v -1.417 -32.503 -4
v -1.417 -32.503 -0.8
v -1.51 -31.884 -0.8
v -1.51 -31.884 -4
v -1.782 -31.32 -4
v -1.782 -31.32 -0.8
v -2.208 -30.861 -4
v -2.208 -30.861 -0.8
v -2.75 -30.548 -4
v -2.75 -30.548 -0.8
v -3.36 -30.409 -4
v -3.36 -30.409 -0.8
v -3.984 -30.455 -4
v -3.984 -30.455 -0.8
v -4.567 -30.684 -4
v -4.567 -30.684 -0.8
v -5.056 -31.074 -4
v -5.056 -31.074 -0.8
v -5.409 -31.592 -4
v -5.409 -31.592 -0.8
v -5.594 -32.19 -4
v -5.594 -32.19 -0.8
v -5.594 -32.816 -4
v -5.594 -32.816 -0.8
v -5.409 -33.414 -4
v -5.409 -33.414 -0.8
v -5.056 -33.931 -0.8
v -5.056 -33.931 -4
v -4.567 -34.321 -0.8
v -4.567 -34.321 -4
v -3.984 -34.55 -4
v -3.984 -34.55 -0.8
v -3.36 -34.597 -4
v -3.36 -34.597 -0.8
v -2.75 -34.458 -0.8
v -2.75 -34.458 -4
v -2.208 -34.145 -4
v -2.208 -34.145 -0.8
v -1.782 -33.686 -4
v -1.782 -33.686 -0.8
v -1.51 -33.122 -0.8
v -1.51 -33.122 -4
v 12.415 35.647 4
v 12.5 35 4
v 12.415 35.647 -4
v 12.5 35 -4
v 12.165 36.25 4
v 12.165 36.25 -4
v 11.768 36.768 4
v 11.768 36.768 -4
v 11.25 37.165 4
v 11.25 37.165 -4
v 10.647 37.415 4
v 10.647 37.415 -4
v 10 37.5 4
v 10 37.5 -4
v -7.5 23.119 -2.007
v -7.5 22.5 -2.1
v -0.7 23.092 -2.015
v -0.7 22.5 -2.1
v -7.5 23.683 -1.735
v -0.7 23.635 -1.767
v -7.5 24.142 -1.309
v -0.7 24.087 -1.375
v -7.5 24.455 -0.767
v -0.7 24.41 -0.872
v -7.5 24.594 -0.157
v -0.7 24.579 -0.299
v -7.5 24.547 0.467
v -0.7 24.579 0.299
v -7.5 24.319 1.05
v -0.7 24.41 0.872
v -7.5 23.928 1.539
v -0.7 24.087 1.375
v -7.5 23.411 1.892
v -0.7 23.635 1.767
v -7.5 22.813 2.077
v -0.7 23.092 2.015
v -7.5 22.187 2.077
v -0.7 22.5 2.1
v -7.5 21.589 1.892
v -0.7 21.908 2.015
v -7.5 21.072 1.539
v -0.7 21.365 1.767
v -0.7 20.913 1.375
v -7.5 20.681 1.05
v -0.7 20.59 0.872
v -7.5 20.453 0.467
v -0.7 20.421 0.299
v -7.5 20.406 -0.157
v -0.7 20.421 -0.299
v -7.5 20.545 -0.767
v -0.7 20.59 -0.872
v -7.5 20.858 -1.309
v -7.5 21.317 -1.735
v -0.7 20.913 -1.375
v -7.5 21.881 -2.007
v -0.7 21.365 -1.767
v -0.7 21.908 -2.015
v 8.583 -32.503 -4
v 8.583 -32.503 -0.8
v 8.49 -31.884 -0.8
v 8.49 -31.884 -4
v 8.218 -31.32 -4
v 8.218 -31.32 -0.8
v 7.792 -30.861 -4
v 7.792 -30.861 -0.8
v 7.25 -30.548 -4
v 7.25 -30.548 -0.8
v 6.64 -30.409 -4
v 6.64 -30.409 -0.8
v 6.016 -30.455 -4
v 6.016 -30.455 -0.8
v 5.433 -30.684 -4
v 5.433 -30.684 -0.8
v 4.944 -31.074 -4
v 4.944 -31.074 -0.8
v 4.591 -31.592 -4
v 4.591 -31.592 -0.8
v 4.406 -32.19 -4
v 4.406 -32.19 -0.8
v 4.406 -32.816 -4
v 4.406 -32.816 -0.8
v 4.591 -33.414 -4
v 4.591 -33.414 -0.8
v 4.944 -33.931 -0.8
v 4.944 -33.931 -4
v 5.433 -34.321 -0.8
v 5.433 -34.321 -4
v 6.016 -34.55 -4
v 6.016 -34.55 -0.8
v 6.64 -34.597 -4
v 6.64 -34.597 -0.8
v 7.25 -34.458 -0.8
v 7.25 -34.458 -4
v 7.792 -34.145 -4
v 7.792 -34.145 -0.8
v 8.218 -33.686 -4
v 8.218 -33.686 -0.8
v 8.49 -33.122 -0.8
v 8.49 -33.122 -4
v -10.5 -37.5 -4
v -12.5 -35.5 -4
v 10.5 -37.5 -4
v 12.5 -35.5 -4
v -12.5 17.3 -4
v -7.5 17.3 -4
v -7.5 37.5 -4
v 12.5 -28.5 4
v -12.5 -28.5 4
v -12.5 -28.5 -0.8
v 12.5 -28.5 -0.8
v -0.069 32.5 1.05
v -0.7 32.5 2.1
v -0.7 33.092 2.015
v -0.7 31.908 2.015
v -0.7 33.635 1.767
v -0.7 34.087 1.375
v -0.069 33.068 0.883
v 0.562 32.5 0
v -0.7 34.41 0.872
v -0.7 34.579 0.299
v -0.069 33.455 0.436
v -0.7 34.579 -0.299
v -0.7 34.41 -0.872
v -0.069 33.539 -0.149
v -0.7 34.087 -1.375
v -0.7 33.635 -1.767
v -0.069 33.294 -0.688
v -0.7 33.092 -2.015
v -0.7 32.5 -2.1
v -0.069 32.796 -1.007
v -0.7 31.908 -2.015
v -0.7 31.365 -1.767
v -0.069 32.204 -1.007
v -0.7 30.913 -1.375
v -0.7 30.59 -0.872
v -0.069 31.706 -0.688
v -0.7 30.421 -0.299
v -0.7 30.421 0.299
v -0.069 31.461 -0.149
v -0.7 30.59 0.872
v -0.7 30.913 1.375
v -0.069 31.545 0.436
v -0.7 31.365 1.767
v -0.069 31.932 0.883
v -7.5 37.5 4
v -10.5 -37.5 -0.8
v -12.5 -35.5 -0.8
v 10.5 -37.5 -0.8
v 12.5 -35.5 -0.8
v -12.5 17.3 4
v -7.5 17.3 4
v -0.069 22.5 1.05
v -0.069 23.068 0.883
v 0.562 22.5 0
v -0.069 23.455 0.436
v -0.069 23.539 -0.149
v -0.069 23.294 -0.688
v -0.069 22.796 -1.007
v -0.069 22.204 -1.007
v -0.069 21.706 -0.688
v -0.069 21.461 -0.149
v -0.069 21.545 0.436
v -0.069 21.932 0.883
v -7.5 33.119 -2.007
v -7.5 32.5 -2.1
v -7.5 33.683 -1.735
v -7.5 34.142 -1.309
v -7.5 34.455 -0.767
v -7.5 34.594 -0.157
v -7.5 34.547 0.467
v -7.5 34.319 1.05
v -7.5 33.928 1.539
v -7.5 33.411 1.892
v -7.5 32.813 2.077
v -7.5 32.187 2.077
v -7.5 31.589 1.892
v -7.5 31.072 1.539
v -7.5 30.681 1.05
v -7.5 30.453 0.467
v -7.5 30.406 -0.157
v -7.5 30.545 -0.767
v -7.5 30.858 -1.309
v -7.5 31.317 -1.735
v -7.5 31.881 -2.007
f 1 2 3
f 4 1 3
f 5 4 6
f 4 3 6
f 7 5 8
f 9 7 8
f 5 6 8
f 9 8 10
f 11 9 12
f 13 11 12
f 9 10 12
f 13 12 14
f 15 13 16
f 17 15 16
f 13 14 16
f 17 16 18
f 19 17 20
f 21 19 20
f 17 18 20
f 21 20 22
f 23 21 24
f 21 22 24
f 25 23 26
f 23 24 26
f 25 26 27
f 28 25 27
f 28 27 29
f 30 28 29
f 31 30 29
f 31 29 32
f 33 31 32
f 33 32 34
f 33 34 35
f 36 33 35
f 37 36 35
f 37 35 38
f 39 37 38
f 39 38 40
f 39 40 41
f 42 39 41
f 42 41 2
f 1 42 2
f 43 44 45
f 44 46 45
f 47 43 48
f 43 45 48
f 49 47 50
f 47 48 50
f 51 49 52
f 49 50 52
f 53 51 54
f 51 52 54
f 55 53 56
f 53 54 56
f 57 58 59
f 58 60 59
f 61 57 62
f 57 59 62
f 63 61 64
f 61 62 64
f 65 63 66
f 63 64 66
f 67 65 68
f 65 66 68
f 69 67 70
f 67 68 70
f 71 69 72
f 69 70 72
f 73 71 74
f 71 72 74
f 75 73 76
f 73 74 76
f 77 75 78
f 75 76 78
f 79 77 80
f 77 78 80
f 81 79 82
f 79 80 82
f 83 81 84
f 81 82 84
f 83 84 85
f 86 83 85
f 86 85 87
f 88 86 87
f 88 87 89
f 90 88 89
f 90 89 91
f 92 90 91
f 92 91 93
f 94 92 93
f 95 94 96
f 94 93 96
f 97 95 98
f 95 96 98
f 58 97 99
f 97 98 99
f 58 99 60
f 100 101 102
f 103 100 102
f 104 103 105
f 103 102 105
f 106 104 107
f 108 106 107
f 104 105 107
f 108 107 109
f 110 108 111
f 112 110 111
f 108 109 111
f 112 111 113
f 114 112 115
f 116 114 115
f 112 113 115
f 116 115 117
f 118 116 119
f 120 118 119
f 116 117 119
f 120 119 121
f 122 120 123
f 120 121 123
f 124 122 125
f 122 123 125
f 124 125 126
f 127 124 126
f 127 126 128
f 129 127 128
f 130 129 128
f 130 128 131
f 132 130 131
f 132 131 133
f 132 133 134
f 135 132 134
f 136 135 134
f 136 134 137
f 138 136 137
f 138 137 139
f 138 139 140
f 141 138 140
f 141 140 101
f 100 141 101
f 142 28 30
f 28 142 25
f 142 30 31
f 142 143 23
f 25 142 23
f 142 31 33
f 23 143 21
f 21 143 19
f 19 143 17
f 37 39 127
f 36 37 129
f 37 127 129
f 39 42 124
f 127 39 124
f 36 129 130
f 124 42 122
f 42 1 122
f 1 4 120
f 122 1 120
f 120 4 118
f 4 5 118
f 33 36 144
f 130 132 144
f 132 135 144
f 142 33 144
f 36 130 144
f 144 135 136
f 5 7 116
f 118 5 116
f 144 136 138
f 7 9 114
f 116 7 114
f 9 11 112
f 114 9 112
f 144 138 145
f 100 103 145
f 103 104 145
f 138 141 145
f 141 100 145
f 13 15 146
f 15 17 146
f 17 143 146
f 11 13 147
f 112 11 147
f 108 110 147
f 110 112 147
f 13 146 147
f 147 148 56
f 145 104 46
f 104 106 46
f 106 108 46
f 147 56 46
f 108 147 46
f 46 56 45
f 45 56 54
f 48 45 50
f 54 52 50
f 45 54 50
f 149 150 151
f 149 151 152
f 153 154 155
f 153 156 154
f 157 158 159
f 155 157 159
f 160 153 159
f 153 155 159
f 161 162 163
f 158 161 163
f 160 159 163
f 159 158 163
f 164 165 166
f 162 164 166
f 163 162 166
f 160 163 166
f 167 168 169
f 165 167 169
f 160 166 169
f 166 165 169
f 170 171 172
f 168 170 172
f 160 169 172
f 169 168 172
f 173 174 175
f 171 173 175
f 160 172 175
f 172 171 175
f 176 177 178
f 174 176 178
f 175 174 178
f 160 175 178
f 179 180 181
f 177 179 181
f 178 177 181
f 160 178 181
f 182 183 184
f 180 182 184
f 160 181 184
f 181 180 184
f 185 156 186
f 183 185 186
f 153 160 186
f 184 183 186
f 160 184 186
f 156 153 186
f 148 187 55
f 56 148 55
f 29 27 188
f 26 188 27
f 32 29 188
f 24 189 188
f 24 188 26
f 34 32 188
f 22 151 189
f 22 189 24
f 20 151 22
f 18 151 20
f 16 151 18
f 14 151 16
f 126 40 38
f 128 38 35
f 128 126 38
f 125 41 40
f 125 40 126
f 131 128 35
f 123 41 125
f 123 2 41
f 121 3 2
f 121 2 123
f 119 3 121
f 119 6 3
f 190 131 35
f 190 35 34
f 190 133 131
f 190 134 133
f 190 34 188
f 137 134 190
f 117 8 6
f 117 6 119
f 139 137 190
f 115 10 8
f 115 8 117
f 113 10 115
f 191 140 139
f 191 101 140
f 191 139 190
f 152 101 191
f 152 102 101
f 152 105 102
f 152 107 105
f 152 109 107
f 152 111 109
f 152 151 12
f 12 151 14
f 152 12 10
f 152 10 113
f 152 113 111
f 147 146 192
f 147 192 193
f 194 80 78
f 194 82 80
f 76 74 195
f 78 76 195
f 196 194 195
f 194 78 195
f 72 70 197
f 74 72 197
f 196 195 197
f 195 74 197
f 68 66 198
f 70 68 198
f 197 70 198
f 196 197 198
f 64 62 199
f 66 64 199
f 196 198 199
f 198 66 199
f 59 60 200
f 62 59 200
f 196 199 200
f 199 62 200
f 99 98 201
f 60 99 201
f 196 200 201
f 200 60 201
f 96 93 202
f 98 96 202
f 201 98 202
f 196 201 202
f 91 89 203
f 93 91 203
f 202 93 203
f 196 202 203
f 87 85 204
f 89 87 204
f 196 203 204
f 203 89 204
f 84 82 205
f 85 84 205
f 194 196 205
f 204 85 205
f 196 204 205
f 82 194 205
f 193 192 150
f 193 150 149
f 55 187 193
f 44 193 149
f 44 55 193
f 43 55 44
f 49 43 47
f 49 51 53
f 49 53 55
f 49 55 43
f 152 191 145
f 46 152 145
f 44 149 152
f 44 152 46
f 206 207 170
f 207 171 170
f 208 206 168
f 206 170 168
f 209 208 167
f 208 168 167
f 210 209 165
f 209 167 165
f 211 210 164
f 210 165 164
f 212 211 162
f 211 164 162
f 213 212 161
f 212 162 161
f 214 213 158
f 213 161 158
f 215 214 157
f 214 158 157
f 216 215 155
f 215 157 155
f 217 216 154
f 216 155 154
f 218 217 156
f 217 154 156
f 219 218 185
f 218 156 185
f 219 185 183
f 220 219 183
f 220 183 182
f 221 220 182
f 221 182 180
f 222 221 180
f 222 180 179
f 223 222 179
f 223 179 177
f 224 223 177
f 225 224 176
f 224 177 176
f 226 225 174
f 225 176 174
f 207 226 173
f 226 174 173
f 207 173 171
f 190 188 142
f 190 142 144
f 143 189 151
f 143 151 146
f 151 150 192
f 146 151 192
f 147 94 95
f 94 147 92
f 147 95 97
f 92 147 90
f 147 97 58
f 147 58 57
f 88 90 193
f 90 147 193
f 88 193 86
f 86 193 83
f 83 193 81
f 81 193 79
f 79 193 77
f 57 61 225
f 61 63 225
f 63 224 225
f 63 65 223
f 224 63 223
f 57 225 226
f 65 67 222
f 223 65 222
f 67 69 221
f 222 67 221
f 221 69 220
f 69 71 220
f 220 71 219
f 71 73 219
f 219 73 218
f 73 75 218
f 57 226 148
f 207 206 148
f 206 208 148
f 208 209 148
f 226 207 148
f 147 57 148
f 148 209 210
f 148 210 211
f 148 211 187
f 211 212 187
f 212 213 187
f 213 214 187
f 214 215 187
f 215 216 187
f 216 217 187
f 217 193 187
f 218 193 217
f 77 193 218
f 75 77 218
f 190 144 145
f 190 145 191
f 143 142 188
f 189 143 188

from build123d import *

# Parameters (mm, degrees)
SKETCH1_W                              = 25
SKETCH1_H                              = 75
BOSS_EXTRUDE1_DEPTH                    = 4
SKETCH2_W                              = 5
SKETCH2_H                              = 20.2
CUT_EXTRUDE1_DEPTH                     = 41.32988966
SKETCH3_W                              = 25
SKETCH3_H                              = 9
CUT_EXTRUDE2_DEPTH                     = 4.8
FILLET1_R                              = 2.5
CHAMFER1_SIZE                          = 2
TAPPED_HOLE_FOR_M4X0_7_HELICOIL1_D     = 4.2
TAPPED_HOLE_FOR_M4X0_7_HELICOIL1_DEPTH = 6.8
TAPPED_HOLE_FOR_M4X0_7_HELICOIL1_TIP   = 1.2618073
M4_CLEARANCE_HOLE1_D                   = 4.2


with BuildPart() as part:
    # Sketch1 → Boss-Extrude1 (new, symmetric)
    with BuildSketch(Plane.XY):
        Rectangle(SKETCH1_W, SKETCH1_H)
    extrude(amount=BOSS_EXTRUDE1_DEPTH, both=True)

    # Sketch2 → Cut-Extrude1 (cut, through all)
    with BuildSketch(Plane.XY.offset(4)):
        with Locations((-10, 27.4)):
            Rectangle(SKETCH2_W, SKETCH2_H)
    extrude(amount=-CUT_EXTRUDE1_DEPTH, mode=Mode.SUBTRACT)

    # Sketch3 → Cut-Extrude2 (cut)
    with BuildSketch(Plane.XY.offset(4)):
        with Locations((0, -33)):
            Rectangle(SKETCH3_W, SKETCH3_H)
    extrude(amount=-CUT_EXTRUDE2_DEPTH, mode=Mode.SUBTRACT)

    # Fillet1
    fillet1_edges = [part.edges().sort_by_distance(p)[0] for p in [
        (12.5, 37.5, 0),
    ]]
    fillet(fillet1_edges, radius=FILLET1_R)

    # Chamfer1
    chamfer1_edges = [part.edges().sort_by_distance(p)[0] for p in [
        (12.5, -37.5, -2.4),
        (-12.5, -37.5, -2.4),
    ]]
    chamfer(chamfer1_edges, length=CHAMFER1_SIZE)

    # Tapped Hole for M4x0.7 Helicoil1
    with Locations(Plane.ZY.offset(7.5)):
        with Locations((0, 22.5), (0, 32.5)):
            Hole(TAPPED_HOLE_FOR_M4X0_7_HELICOIL1_D / 2, depth=TAPPED_HOLE_FOR_M4X0_7_HELICOIL1_DEPTH)
            with Locations((0, 0, -(TAPPED_HOLE_FOR_M4X0_7_HELICOIL1_DEPTH + TAPPED_HOLE_FOR_M4X0_7_HELICOIL1_TIP / 2))):  # 118° drill point
                Cone(0, TAPPED_HOLE_FOR_M4X0_7_HELICOIL1_D / 2, TAPPED_HOLE_FOR_M4X0_7_HELICOIL1_TIP, mode=Mode.SUBTRACT)

    # M4 Clearance Hole1 (through all)
    with Locations(Plane(origin=(0, 0, -4), x_dir=(-1, 0, 0), z_dir=(0, 0, -1))):
        with Locations((-6.483, -32.5028), (3.517, -32.5028)):
            Hole(M4_CLEARANCE_HOLE1_D / 2)


solid = part.part
